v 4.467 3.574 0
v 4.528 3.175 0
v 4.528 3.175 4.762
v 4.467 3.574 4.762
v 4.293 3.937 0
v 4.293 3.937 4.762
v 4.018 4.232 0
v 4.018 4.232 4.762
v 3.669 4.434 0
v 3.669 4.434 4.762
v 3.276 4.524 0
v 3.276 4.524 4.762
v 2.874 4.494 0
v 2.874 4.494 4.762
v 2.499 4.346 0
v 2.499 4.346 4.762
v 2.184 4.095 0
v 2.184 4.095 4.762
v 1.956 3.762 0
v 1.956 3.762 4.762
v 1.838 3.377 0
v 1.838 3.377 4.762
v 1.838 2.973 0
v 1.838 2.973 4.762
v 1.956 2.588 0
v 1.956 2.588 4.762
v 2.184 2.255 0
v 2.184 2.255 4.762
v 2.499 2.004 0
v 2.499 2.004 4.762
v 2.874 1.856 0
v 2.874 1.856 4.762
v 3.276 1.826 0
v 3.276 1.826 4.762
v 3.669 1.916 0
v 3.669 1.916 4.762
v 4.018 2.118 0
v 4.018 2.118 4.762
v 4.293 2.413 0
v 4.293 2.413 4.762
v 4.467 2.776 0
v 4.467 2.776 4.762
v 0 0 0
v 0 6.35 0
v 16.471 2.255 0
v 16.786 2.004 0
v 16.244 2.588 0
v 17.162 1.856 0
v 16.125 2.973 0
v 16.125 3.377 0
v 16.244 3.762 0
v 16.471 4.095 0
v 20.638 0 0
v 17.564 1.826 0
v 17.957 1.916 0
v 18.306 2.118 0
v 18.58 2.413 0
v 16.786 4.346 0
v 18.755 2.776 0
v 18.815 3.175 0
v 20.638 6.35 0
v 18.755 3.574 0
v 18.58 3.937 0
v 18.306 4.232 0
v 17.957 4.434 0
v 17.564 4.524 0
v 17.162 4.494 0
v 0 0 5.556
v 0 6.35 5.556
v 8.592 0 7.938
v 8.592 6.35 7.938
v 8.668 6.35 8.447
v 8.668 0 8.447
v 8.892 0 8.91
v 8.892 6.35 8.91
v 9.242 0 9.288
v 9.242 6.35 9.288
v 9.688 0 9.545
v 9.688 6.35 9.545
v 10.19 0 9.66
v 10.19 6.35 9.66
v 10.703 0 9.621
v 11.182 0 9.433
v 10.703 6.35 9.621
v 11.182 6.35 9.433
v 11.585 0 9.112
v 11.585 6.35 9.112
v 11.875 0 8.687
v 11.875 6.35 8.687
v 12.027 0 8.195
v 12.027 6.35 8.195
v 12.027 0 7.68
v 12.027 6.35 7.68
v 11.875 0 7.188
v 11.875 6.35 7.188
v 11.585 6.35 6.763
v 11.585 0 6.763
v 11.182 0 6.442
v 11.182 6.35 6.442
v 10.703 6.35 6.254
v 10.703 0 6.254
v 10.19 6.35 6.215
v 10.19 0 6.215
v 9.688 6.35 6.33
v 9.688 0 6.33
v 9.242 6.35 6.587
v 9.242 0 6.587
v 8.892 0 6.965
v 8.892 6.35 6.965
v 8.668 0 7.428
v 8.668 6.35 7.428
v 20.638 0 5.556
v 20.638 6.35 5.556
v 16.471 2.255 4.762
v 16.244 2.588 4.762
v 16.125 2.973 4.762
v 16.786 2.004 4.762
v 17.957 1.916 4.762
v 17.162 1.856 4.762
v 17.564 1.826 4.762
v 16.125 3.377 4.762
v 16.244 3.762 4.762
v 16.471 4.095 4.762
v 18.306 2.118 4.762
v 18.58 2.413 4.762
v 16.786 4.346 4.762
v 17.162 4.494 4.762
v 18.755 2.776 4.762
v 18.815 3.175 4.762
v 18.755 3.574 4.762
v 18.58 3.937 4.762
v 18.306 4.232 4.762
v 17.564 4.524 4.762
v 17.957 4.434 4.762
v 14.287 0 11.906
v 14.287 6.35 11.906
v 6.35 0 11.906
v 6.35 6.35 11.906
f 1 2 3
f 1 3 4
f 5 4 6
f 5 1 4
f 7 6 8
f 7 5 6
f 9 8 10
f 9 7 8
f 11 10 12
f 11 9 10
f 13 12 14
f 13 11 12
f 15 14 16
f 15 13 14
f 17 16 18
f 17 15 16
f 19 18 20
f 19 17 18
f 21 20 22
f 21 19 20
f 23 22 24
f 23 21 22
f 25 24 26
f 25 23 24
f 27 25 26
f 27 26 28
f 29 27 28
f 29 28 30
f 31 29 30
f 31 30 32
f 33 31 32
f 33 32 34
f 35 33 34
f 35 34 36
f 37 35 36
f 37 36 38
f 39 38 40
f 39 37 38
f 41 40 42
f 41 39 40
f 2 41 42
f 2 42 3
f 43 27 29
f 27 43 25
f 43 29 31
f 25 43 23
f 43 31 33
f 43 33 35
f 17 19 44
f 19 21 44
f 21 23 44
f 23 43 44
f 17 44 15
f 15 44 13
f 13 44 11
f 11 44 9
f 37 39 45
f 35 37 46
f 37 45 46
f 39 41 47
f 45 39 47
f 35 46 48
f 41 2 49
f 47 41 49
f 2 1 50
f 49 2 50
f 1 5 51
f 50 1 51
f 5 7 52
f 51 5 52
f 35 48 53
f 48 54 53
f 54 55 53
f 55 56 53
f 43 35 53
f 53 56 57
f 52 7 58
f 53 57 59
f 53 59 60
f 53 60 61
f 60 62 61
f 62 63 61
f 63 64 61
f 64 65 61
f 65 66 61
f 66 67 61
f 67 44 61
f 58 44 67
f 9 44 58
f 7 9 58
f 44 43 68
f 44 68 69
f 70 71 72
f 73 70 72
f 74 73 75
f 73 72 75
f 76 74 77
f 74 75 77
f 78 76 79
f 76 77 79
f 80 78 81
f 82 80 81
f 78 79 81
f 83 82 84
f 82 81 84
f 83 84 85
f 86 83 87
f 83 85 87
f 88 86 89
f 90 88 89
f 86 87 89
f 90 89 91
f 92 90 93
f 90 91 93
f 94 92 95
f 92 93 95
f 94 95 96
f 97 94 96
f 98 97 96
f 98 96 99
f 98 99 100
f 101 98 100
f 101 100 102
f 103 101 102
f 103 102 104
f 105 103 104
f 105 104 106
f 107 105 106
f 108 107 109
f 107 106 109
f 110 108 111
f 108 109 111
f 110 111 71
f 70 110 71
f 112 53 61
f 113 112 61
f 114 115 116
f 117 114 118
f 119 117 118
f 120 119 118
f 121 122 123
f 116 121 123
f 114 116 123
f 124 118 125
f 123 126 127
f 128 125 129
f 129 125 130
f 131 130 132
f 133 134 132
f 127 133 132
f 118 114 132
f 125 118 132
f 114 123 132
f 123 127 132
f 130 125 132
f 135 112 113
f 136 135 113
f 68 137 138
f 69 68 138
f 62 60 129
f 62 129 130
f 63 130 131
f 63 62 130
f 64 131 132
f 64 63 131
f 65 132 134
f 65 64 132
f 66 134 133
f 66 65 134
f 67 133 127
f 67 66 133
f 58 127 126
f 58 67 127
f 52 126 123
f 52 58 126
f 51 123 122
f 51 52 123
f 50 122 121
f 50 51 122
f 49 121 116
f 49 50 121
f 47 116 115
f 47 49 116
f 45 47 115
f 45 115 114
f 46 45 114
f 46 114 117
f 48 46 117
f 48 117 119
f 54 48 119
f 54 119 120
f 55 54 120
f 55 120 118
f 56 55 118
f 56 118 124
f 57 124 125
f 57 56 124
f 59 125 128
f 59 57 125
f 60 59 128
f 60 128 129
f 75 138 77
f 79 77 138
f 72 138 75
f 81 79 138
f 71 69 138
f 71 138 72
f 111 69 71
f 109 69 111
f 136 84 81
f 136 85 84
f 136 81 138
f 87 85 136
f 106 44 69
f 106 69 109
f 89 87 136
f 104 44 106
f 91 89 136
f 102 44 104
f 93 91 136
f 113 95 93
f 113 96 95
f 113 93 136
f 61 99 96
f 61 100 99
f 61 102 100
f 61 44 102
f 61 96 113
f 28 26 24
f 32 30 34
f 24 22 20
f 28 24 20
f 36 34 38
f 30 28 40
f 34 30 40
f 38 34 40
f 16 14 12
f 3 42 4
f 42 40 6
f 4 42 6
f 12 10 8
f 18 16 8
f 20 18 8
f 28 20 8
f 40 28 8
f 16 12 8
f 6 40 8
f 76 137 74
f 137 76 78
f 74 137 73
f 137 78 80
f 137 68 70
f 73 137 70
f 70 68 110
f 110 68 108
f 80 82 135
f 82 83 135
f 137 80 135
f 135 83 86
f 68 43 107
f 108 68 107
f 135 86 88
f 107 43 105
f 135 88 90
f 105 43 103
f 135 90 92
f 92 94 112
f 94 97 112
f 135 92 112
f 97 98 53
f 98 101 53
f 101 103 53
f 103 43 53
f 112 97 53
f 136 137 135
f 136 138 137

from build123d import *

# Parameters (mm, degrees)
F0_W     = 20.6375
F0_H     = 6.35
F0_R     = 1.35255
F1_DEPTH = 4.7625
F2_W     = 20.6375
F2_H     = 6.35
F3_DEPTH = 7.14375
F4_SIZE  = 6.35
F5_R     = 1.7272
F6_DEPTH = 6.35


with BuildPart() as f1:
    # F0 (on Top) → F1 (new body)
    with BuildSketch(Plane.XY):
        with Locations((10.31875, 3.175)):
            Rectangle(F0_W, F0_H)
        with Locations((3.175, 3.175)):
            Circle(F0_R, mode=Mode.SUBTRACT)
        with Locations((17.4625, 3.175)):
            Circle(F0_R, mode=Mode.SUBTRACT)
    extrude(amount=F1_DEPTH)

    # F2 (on face) → F3 (join)
    with BuildSketch(Plane.XY.offset(4.7625)):
        with Locations((10.31875, 3.175)):
            Rectangle(F2_W, F2_H)
    extrude(amount=F3_DEPTH)

    # F4
    f4_edges = [f1.edges().sort_by_distance(p)[0] for p in [
        (20.6375, 3.175, 11.90625),
        (0, 3.175, 11.90625),
    ]]
    chamfer(f4_edges, length=F4_SIZE)

    # F5 (on face) → F6 (cut, through all)
    with BuildSketch(Plane(origin=(0, 6.35, 0), x_dir=(-1, 0, 0), z_dir=(0, 1, 0))):
        with Locations((-10.31875, 7.9375)):
            Circle(F5_R)
    extrude(amount=-F6_DEPTH, mode=Mode.SUBTRACT)


solid = f1.part
